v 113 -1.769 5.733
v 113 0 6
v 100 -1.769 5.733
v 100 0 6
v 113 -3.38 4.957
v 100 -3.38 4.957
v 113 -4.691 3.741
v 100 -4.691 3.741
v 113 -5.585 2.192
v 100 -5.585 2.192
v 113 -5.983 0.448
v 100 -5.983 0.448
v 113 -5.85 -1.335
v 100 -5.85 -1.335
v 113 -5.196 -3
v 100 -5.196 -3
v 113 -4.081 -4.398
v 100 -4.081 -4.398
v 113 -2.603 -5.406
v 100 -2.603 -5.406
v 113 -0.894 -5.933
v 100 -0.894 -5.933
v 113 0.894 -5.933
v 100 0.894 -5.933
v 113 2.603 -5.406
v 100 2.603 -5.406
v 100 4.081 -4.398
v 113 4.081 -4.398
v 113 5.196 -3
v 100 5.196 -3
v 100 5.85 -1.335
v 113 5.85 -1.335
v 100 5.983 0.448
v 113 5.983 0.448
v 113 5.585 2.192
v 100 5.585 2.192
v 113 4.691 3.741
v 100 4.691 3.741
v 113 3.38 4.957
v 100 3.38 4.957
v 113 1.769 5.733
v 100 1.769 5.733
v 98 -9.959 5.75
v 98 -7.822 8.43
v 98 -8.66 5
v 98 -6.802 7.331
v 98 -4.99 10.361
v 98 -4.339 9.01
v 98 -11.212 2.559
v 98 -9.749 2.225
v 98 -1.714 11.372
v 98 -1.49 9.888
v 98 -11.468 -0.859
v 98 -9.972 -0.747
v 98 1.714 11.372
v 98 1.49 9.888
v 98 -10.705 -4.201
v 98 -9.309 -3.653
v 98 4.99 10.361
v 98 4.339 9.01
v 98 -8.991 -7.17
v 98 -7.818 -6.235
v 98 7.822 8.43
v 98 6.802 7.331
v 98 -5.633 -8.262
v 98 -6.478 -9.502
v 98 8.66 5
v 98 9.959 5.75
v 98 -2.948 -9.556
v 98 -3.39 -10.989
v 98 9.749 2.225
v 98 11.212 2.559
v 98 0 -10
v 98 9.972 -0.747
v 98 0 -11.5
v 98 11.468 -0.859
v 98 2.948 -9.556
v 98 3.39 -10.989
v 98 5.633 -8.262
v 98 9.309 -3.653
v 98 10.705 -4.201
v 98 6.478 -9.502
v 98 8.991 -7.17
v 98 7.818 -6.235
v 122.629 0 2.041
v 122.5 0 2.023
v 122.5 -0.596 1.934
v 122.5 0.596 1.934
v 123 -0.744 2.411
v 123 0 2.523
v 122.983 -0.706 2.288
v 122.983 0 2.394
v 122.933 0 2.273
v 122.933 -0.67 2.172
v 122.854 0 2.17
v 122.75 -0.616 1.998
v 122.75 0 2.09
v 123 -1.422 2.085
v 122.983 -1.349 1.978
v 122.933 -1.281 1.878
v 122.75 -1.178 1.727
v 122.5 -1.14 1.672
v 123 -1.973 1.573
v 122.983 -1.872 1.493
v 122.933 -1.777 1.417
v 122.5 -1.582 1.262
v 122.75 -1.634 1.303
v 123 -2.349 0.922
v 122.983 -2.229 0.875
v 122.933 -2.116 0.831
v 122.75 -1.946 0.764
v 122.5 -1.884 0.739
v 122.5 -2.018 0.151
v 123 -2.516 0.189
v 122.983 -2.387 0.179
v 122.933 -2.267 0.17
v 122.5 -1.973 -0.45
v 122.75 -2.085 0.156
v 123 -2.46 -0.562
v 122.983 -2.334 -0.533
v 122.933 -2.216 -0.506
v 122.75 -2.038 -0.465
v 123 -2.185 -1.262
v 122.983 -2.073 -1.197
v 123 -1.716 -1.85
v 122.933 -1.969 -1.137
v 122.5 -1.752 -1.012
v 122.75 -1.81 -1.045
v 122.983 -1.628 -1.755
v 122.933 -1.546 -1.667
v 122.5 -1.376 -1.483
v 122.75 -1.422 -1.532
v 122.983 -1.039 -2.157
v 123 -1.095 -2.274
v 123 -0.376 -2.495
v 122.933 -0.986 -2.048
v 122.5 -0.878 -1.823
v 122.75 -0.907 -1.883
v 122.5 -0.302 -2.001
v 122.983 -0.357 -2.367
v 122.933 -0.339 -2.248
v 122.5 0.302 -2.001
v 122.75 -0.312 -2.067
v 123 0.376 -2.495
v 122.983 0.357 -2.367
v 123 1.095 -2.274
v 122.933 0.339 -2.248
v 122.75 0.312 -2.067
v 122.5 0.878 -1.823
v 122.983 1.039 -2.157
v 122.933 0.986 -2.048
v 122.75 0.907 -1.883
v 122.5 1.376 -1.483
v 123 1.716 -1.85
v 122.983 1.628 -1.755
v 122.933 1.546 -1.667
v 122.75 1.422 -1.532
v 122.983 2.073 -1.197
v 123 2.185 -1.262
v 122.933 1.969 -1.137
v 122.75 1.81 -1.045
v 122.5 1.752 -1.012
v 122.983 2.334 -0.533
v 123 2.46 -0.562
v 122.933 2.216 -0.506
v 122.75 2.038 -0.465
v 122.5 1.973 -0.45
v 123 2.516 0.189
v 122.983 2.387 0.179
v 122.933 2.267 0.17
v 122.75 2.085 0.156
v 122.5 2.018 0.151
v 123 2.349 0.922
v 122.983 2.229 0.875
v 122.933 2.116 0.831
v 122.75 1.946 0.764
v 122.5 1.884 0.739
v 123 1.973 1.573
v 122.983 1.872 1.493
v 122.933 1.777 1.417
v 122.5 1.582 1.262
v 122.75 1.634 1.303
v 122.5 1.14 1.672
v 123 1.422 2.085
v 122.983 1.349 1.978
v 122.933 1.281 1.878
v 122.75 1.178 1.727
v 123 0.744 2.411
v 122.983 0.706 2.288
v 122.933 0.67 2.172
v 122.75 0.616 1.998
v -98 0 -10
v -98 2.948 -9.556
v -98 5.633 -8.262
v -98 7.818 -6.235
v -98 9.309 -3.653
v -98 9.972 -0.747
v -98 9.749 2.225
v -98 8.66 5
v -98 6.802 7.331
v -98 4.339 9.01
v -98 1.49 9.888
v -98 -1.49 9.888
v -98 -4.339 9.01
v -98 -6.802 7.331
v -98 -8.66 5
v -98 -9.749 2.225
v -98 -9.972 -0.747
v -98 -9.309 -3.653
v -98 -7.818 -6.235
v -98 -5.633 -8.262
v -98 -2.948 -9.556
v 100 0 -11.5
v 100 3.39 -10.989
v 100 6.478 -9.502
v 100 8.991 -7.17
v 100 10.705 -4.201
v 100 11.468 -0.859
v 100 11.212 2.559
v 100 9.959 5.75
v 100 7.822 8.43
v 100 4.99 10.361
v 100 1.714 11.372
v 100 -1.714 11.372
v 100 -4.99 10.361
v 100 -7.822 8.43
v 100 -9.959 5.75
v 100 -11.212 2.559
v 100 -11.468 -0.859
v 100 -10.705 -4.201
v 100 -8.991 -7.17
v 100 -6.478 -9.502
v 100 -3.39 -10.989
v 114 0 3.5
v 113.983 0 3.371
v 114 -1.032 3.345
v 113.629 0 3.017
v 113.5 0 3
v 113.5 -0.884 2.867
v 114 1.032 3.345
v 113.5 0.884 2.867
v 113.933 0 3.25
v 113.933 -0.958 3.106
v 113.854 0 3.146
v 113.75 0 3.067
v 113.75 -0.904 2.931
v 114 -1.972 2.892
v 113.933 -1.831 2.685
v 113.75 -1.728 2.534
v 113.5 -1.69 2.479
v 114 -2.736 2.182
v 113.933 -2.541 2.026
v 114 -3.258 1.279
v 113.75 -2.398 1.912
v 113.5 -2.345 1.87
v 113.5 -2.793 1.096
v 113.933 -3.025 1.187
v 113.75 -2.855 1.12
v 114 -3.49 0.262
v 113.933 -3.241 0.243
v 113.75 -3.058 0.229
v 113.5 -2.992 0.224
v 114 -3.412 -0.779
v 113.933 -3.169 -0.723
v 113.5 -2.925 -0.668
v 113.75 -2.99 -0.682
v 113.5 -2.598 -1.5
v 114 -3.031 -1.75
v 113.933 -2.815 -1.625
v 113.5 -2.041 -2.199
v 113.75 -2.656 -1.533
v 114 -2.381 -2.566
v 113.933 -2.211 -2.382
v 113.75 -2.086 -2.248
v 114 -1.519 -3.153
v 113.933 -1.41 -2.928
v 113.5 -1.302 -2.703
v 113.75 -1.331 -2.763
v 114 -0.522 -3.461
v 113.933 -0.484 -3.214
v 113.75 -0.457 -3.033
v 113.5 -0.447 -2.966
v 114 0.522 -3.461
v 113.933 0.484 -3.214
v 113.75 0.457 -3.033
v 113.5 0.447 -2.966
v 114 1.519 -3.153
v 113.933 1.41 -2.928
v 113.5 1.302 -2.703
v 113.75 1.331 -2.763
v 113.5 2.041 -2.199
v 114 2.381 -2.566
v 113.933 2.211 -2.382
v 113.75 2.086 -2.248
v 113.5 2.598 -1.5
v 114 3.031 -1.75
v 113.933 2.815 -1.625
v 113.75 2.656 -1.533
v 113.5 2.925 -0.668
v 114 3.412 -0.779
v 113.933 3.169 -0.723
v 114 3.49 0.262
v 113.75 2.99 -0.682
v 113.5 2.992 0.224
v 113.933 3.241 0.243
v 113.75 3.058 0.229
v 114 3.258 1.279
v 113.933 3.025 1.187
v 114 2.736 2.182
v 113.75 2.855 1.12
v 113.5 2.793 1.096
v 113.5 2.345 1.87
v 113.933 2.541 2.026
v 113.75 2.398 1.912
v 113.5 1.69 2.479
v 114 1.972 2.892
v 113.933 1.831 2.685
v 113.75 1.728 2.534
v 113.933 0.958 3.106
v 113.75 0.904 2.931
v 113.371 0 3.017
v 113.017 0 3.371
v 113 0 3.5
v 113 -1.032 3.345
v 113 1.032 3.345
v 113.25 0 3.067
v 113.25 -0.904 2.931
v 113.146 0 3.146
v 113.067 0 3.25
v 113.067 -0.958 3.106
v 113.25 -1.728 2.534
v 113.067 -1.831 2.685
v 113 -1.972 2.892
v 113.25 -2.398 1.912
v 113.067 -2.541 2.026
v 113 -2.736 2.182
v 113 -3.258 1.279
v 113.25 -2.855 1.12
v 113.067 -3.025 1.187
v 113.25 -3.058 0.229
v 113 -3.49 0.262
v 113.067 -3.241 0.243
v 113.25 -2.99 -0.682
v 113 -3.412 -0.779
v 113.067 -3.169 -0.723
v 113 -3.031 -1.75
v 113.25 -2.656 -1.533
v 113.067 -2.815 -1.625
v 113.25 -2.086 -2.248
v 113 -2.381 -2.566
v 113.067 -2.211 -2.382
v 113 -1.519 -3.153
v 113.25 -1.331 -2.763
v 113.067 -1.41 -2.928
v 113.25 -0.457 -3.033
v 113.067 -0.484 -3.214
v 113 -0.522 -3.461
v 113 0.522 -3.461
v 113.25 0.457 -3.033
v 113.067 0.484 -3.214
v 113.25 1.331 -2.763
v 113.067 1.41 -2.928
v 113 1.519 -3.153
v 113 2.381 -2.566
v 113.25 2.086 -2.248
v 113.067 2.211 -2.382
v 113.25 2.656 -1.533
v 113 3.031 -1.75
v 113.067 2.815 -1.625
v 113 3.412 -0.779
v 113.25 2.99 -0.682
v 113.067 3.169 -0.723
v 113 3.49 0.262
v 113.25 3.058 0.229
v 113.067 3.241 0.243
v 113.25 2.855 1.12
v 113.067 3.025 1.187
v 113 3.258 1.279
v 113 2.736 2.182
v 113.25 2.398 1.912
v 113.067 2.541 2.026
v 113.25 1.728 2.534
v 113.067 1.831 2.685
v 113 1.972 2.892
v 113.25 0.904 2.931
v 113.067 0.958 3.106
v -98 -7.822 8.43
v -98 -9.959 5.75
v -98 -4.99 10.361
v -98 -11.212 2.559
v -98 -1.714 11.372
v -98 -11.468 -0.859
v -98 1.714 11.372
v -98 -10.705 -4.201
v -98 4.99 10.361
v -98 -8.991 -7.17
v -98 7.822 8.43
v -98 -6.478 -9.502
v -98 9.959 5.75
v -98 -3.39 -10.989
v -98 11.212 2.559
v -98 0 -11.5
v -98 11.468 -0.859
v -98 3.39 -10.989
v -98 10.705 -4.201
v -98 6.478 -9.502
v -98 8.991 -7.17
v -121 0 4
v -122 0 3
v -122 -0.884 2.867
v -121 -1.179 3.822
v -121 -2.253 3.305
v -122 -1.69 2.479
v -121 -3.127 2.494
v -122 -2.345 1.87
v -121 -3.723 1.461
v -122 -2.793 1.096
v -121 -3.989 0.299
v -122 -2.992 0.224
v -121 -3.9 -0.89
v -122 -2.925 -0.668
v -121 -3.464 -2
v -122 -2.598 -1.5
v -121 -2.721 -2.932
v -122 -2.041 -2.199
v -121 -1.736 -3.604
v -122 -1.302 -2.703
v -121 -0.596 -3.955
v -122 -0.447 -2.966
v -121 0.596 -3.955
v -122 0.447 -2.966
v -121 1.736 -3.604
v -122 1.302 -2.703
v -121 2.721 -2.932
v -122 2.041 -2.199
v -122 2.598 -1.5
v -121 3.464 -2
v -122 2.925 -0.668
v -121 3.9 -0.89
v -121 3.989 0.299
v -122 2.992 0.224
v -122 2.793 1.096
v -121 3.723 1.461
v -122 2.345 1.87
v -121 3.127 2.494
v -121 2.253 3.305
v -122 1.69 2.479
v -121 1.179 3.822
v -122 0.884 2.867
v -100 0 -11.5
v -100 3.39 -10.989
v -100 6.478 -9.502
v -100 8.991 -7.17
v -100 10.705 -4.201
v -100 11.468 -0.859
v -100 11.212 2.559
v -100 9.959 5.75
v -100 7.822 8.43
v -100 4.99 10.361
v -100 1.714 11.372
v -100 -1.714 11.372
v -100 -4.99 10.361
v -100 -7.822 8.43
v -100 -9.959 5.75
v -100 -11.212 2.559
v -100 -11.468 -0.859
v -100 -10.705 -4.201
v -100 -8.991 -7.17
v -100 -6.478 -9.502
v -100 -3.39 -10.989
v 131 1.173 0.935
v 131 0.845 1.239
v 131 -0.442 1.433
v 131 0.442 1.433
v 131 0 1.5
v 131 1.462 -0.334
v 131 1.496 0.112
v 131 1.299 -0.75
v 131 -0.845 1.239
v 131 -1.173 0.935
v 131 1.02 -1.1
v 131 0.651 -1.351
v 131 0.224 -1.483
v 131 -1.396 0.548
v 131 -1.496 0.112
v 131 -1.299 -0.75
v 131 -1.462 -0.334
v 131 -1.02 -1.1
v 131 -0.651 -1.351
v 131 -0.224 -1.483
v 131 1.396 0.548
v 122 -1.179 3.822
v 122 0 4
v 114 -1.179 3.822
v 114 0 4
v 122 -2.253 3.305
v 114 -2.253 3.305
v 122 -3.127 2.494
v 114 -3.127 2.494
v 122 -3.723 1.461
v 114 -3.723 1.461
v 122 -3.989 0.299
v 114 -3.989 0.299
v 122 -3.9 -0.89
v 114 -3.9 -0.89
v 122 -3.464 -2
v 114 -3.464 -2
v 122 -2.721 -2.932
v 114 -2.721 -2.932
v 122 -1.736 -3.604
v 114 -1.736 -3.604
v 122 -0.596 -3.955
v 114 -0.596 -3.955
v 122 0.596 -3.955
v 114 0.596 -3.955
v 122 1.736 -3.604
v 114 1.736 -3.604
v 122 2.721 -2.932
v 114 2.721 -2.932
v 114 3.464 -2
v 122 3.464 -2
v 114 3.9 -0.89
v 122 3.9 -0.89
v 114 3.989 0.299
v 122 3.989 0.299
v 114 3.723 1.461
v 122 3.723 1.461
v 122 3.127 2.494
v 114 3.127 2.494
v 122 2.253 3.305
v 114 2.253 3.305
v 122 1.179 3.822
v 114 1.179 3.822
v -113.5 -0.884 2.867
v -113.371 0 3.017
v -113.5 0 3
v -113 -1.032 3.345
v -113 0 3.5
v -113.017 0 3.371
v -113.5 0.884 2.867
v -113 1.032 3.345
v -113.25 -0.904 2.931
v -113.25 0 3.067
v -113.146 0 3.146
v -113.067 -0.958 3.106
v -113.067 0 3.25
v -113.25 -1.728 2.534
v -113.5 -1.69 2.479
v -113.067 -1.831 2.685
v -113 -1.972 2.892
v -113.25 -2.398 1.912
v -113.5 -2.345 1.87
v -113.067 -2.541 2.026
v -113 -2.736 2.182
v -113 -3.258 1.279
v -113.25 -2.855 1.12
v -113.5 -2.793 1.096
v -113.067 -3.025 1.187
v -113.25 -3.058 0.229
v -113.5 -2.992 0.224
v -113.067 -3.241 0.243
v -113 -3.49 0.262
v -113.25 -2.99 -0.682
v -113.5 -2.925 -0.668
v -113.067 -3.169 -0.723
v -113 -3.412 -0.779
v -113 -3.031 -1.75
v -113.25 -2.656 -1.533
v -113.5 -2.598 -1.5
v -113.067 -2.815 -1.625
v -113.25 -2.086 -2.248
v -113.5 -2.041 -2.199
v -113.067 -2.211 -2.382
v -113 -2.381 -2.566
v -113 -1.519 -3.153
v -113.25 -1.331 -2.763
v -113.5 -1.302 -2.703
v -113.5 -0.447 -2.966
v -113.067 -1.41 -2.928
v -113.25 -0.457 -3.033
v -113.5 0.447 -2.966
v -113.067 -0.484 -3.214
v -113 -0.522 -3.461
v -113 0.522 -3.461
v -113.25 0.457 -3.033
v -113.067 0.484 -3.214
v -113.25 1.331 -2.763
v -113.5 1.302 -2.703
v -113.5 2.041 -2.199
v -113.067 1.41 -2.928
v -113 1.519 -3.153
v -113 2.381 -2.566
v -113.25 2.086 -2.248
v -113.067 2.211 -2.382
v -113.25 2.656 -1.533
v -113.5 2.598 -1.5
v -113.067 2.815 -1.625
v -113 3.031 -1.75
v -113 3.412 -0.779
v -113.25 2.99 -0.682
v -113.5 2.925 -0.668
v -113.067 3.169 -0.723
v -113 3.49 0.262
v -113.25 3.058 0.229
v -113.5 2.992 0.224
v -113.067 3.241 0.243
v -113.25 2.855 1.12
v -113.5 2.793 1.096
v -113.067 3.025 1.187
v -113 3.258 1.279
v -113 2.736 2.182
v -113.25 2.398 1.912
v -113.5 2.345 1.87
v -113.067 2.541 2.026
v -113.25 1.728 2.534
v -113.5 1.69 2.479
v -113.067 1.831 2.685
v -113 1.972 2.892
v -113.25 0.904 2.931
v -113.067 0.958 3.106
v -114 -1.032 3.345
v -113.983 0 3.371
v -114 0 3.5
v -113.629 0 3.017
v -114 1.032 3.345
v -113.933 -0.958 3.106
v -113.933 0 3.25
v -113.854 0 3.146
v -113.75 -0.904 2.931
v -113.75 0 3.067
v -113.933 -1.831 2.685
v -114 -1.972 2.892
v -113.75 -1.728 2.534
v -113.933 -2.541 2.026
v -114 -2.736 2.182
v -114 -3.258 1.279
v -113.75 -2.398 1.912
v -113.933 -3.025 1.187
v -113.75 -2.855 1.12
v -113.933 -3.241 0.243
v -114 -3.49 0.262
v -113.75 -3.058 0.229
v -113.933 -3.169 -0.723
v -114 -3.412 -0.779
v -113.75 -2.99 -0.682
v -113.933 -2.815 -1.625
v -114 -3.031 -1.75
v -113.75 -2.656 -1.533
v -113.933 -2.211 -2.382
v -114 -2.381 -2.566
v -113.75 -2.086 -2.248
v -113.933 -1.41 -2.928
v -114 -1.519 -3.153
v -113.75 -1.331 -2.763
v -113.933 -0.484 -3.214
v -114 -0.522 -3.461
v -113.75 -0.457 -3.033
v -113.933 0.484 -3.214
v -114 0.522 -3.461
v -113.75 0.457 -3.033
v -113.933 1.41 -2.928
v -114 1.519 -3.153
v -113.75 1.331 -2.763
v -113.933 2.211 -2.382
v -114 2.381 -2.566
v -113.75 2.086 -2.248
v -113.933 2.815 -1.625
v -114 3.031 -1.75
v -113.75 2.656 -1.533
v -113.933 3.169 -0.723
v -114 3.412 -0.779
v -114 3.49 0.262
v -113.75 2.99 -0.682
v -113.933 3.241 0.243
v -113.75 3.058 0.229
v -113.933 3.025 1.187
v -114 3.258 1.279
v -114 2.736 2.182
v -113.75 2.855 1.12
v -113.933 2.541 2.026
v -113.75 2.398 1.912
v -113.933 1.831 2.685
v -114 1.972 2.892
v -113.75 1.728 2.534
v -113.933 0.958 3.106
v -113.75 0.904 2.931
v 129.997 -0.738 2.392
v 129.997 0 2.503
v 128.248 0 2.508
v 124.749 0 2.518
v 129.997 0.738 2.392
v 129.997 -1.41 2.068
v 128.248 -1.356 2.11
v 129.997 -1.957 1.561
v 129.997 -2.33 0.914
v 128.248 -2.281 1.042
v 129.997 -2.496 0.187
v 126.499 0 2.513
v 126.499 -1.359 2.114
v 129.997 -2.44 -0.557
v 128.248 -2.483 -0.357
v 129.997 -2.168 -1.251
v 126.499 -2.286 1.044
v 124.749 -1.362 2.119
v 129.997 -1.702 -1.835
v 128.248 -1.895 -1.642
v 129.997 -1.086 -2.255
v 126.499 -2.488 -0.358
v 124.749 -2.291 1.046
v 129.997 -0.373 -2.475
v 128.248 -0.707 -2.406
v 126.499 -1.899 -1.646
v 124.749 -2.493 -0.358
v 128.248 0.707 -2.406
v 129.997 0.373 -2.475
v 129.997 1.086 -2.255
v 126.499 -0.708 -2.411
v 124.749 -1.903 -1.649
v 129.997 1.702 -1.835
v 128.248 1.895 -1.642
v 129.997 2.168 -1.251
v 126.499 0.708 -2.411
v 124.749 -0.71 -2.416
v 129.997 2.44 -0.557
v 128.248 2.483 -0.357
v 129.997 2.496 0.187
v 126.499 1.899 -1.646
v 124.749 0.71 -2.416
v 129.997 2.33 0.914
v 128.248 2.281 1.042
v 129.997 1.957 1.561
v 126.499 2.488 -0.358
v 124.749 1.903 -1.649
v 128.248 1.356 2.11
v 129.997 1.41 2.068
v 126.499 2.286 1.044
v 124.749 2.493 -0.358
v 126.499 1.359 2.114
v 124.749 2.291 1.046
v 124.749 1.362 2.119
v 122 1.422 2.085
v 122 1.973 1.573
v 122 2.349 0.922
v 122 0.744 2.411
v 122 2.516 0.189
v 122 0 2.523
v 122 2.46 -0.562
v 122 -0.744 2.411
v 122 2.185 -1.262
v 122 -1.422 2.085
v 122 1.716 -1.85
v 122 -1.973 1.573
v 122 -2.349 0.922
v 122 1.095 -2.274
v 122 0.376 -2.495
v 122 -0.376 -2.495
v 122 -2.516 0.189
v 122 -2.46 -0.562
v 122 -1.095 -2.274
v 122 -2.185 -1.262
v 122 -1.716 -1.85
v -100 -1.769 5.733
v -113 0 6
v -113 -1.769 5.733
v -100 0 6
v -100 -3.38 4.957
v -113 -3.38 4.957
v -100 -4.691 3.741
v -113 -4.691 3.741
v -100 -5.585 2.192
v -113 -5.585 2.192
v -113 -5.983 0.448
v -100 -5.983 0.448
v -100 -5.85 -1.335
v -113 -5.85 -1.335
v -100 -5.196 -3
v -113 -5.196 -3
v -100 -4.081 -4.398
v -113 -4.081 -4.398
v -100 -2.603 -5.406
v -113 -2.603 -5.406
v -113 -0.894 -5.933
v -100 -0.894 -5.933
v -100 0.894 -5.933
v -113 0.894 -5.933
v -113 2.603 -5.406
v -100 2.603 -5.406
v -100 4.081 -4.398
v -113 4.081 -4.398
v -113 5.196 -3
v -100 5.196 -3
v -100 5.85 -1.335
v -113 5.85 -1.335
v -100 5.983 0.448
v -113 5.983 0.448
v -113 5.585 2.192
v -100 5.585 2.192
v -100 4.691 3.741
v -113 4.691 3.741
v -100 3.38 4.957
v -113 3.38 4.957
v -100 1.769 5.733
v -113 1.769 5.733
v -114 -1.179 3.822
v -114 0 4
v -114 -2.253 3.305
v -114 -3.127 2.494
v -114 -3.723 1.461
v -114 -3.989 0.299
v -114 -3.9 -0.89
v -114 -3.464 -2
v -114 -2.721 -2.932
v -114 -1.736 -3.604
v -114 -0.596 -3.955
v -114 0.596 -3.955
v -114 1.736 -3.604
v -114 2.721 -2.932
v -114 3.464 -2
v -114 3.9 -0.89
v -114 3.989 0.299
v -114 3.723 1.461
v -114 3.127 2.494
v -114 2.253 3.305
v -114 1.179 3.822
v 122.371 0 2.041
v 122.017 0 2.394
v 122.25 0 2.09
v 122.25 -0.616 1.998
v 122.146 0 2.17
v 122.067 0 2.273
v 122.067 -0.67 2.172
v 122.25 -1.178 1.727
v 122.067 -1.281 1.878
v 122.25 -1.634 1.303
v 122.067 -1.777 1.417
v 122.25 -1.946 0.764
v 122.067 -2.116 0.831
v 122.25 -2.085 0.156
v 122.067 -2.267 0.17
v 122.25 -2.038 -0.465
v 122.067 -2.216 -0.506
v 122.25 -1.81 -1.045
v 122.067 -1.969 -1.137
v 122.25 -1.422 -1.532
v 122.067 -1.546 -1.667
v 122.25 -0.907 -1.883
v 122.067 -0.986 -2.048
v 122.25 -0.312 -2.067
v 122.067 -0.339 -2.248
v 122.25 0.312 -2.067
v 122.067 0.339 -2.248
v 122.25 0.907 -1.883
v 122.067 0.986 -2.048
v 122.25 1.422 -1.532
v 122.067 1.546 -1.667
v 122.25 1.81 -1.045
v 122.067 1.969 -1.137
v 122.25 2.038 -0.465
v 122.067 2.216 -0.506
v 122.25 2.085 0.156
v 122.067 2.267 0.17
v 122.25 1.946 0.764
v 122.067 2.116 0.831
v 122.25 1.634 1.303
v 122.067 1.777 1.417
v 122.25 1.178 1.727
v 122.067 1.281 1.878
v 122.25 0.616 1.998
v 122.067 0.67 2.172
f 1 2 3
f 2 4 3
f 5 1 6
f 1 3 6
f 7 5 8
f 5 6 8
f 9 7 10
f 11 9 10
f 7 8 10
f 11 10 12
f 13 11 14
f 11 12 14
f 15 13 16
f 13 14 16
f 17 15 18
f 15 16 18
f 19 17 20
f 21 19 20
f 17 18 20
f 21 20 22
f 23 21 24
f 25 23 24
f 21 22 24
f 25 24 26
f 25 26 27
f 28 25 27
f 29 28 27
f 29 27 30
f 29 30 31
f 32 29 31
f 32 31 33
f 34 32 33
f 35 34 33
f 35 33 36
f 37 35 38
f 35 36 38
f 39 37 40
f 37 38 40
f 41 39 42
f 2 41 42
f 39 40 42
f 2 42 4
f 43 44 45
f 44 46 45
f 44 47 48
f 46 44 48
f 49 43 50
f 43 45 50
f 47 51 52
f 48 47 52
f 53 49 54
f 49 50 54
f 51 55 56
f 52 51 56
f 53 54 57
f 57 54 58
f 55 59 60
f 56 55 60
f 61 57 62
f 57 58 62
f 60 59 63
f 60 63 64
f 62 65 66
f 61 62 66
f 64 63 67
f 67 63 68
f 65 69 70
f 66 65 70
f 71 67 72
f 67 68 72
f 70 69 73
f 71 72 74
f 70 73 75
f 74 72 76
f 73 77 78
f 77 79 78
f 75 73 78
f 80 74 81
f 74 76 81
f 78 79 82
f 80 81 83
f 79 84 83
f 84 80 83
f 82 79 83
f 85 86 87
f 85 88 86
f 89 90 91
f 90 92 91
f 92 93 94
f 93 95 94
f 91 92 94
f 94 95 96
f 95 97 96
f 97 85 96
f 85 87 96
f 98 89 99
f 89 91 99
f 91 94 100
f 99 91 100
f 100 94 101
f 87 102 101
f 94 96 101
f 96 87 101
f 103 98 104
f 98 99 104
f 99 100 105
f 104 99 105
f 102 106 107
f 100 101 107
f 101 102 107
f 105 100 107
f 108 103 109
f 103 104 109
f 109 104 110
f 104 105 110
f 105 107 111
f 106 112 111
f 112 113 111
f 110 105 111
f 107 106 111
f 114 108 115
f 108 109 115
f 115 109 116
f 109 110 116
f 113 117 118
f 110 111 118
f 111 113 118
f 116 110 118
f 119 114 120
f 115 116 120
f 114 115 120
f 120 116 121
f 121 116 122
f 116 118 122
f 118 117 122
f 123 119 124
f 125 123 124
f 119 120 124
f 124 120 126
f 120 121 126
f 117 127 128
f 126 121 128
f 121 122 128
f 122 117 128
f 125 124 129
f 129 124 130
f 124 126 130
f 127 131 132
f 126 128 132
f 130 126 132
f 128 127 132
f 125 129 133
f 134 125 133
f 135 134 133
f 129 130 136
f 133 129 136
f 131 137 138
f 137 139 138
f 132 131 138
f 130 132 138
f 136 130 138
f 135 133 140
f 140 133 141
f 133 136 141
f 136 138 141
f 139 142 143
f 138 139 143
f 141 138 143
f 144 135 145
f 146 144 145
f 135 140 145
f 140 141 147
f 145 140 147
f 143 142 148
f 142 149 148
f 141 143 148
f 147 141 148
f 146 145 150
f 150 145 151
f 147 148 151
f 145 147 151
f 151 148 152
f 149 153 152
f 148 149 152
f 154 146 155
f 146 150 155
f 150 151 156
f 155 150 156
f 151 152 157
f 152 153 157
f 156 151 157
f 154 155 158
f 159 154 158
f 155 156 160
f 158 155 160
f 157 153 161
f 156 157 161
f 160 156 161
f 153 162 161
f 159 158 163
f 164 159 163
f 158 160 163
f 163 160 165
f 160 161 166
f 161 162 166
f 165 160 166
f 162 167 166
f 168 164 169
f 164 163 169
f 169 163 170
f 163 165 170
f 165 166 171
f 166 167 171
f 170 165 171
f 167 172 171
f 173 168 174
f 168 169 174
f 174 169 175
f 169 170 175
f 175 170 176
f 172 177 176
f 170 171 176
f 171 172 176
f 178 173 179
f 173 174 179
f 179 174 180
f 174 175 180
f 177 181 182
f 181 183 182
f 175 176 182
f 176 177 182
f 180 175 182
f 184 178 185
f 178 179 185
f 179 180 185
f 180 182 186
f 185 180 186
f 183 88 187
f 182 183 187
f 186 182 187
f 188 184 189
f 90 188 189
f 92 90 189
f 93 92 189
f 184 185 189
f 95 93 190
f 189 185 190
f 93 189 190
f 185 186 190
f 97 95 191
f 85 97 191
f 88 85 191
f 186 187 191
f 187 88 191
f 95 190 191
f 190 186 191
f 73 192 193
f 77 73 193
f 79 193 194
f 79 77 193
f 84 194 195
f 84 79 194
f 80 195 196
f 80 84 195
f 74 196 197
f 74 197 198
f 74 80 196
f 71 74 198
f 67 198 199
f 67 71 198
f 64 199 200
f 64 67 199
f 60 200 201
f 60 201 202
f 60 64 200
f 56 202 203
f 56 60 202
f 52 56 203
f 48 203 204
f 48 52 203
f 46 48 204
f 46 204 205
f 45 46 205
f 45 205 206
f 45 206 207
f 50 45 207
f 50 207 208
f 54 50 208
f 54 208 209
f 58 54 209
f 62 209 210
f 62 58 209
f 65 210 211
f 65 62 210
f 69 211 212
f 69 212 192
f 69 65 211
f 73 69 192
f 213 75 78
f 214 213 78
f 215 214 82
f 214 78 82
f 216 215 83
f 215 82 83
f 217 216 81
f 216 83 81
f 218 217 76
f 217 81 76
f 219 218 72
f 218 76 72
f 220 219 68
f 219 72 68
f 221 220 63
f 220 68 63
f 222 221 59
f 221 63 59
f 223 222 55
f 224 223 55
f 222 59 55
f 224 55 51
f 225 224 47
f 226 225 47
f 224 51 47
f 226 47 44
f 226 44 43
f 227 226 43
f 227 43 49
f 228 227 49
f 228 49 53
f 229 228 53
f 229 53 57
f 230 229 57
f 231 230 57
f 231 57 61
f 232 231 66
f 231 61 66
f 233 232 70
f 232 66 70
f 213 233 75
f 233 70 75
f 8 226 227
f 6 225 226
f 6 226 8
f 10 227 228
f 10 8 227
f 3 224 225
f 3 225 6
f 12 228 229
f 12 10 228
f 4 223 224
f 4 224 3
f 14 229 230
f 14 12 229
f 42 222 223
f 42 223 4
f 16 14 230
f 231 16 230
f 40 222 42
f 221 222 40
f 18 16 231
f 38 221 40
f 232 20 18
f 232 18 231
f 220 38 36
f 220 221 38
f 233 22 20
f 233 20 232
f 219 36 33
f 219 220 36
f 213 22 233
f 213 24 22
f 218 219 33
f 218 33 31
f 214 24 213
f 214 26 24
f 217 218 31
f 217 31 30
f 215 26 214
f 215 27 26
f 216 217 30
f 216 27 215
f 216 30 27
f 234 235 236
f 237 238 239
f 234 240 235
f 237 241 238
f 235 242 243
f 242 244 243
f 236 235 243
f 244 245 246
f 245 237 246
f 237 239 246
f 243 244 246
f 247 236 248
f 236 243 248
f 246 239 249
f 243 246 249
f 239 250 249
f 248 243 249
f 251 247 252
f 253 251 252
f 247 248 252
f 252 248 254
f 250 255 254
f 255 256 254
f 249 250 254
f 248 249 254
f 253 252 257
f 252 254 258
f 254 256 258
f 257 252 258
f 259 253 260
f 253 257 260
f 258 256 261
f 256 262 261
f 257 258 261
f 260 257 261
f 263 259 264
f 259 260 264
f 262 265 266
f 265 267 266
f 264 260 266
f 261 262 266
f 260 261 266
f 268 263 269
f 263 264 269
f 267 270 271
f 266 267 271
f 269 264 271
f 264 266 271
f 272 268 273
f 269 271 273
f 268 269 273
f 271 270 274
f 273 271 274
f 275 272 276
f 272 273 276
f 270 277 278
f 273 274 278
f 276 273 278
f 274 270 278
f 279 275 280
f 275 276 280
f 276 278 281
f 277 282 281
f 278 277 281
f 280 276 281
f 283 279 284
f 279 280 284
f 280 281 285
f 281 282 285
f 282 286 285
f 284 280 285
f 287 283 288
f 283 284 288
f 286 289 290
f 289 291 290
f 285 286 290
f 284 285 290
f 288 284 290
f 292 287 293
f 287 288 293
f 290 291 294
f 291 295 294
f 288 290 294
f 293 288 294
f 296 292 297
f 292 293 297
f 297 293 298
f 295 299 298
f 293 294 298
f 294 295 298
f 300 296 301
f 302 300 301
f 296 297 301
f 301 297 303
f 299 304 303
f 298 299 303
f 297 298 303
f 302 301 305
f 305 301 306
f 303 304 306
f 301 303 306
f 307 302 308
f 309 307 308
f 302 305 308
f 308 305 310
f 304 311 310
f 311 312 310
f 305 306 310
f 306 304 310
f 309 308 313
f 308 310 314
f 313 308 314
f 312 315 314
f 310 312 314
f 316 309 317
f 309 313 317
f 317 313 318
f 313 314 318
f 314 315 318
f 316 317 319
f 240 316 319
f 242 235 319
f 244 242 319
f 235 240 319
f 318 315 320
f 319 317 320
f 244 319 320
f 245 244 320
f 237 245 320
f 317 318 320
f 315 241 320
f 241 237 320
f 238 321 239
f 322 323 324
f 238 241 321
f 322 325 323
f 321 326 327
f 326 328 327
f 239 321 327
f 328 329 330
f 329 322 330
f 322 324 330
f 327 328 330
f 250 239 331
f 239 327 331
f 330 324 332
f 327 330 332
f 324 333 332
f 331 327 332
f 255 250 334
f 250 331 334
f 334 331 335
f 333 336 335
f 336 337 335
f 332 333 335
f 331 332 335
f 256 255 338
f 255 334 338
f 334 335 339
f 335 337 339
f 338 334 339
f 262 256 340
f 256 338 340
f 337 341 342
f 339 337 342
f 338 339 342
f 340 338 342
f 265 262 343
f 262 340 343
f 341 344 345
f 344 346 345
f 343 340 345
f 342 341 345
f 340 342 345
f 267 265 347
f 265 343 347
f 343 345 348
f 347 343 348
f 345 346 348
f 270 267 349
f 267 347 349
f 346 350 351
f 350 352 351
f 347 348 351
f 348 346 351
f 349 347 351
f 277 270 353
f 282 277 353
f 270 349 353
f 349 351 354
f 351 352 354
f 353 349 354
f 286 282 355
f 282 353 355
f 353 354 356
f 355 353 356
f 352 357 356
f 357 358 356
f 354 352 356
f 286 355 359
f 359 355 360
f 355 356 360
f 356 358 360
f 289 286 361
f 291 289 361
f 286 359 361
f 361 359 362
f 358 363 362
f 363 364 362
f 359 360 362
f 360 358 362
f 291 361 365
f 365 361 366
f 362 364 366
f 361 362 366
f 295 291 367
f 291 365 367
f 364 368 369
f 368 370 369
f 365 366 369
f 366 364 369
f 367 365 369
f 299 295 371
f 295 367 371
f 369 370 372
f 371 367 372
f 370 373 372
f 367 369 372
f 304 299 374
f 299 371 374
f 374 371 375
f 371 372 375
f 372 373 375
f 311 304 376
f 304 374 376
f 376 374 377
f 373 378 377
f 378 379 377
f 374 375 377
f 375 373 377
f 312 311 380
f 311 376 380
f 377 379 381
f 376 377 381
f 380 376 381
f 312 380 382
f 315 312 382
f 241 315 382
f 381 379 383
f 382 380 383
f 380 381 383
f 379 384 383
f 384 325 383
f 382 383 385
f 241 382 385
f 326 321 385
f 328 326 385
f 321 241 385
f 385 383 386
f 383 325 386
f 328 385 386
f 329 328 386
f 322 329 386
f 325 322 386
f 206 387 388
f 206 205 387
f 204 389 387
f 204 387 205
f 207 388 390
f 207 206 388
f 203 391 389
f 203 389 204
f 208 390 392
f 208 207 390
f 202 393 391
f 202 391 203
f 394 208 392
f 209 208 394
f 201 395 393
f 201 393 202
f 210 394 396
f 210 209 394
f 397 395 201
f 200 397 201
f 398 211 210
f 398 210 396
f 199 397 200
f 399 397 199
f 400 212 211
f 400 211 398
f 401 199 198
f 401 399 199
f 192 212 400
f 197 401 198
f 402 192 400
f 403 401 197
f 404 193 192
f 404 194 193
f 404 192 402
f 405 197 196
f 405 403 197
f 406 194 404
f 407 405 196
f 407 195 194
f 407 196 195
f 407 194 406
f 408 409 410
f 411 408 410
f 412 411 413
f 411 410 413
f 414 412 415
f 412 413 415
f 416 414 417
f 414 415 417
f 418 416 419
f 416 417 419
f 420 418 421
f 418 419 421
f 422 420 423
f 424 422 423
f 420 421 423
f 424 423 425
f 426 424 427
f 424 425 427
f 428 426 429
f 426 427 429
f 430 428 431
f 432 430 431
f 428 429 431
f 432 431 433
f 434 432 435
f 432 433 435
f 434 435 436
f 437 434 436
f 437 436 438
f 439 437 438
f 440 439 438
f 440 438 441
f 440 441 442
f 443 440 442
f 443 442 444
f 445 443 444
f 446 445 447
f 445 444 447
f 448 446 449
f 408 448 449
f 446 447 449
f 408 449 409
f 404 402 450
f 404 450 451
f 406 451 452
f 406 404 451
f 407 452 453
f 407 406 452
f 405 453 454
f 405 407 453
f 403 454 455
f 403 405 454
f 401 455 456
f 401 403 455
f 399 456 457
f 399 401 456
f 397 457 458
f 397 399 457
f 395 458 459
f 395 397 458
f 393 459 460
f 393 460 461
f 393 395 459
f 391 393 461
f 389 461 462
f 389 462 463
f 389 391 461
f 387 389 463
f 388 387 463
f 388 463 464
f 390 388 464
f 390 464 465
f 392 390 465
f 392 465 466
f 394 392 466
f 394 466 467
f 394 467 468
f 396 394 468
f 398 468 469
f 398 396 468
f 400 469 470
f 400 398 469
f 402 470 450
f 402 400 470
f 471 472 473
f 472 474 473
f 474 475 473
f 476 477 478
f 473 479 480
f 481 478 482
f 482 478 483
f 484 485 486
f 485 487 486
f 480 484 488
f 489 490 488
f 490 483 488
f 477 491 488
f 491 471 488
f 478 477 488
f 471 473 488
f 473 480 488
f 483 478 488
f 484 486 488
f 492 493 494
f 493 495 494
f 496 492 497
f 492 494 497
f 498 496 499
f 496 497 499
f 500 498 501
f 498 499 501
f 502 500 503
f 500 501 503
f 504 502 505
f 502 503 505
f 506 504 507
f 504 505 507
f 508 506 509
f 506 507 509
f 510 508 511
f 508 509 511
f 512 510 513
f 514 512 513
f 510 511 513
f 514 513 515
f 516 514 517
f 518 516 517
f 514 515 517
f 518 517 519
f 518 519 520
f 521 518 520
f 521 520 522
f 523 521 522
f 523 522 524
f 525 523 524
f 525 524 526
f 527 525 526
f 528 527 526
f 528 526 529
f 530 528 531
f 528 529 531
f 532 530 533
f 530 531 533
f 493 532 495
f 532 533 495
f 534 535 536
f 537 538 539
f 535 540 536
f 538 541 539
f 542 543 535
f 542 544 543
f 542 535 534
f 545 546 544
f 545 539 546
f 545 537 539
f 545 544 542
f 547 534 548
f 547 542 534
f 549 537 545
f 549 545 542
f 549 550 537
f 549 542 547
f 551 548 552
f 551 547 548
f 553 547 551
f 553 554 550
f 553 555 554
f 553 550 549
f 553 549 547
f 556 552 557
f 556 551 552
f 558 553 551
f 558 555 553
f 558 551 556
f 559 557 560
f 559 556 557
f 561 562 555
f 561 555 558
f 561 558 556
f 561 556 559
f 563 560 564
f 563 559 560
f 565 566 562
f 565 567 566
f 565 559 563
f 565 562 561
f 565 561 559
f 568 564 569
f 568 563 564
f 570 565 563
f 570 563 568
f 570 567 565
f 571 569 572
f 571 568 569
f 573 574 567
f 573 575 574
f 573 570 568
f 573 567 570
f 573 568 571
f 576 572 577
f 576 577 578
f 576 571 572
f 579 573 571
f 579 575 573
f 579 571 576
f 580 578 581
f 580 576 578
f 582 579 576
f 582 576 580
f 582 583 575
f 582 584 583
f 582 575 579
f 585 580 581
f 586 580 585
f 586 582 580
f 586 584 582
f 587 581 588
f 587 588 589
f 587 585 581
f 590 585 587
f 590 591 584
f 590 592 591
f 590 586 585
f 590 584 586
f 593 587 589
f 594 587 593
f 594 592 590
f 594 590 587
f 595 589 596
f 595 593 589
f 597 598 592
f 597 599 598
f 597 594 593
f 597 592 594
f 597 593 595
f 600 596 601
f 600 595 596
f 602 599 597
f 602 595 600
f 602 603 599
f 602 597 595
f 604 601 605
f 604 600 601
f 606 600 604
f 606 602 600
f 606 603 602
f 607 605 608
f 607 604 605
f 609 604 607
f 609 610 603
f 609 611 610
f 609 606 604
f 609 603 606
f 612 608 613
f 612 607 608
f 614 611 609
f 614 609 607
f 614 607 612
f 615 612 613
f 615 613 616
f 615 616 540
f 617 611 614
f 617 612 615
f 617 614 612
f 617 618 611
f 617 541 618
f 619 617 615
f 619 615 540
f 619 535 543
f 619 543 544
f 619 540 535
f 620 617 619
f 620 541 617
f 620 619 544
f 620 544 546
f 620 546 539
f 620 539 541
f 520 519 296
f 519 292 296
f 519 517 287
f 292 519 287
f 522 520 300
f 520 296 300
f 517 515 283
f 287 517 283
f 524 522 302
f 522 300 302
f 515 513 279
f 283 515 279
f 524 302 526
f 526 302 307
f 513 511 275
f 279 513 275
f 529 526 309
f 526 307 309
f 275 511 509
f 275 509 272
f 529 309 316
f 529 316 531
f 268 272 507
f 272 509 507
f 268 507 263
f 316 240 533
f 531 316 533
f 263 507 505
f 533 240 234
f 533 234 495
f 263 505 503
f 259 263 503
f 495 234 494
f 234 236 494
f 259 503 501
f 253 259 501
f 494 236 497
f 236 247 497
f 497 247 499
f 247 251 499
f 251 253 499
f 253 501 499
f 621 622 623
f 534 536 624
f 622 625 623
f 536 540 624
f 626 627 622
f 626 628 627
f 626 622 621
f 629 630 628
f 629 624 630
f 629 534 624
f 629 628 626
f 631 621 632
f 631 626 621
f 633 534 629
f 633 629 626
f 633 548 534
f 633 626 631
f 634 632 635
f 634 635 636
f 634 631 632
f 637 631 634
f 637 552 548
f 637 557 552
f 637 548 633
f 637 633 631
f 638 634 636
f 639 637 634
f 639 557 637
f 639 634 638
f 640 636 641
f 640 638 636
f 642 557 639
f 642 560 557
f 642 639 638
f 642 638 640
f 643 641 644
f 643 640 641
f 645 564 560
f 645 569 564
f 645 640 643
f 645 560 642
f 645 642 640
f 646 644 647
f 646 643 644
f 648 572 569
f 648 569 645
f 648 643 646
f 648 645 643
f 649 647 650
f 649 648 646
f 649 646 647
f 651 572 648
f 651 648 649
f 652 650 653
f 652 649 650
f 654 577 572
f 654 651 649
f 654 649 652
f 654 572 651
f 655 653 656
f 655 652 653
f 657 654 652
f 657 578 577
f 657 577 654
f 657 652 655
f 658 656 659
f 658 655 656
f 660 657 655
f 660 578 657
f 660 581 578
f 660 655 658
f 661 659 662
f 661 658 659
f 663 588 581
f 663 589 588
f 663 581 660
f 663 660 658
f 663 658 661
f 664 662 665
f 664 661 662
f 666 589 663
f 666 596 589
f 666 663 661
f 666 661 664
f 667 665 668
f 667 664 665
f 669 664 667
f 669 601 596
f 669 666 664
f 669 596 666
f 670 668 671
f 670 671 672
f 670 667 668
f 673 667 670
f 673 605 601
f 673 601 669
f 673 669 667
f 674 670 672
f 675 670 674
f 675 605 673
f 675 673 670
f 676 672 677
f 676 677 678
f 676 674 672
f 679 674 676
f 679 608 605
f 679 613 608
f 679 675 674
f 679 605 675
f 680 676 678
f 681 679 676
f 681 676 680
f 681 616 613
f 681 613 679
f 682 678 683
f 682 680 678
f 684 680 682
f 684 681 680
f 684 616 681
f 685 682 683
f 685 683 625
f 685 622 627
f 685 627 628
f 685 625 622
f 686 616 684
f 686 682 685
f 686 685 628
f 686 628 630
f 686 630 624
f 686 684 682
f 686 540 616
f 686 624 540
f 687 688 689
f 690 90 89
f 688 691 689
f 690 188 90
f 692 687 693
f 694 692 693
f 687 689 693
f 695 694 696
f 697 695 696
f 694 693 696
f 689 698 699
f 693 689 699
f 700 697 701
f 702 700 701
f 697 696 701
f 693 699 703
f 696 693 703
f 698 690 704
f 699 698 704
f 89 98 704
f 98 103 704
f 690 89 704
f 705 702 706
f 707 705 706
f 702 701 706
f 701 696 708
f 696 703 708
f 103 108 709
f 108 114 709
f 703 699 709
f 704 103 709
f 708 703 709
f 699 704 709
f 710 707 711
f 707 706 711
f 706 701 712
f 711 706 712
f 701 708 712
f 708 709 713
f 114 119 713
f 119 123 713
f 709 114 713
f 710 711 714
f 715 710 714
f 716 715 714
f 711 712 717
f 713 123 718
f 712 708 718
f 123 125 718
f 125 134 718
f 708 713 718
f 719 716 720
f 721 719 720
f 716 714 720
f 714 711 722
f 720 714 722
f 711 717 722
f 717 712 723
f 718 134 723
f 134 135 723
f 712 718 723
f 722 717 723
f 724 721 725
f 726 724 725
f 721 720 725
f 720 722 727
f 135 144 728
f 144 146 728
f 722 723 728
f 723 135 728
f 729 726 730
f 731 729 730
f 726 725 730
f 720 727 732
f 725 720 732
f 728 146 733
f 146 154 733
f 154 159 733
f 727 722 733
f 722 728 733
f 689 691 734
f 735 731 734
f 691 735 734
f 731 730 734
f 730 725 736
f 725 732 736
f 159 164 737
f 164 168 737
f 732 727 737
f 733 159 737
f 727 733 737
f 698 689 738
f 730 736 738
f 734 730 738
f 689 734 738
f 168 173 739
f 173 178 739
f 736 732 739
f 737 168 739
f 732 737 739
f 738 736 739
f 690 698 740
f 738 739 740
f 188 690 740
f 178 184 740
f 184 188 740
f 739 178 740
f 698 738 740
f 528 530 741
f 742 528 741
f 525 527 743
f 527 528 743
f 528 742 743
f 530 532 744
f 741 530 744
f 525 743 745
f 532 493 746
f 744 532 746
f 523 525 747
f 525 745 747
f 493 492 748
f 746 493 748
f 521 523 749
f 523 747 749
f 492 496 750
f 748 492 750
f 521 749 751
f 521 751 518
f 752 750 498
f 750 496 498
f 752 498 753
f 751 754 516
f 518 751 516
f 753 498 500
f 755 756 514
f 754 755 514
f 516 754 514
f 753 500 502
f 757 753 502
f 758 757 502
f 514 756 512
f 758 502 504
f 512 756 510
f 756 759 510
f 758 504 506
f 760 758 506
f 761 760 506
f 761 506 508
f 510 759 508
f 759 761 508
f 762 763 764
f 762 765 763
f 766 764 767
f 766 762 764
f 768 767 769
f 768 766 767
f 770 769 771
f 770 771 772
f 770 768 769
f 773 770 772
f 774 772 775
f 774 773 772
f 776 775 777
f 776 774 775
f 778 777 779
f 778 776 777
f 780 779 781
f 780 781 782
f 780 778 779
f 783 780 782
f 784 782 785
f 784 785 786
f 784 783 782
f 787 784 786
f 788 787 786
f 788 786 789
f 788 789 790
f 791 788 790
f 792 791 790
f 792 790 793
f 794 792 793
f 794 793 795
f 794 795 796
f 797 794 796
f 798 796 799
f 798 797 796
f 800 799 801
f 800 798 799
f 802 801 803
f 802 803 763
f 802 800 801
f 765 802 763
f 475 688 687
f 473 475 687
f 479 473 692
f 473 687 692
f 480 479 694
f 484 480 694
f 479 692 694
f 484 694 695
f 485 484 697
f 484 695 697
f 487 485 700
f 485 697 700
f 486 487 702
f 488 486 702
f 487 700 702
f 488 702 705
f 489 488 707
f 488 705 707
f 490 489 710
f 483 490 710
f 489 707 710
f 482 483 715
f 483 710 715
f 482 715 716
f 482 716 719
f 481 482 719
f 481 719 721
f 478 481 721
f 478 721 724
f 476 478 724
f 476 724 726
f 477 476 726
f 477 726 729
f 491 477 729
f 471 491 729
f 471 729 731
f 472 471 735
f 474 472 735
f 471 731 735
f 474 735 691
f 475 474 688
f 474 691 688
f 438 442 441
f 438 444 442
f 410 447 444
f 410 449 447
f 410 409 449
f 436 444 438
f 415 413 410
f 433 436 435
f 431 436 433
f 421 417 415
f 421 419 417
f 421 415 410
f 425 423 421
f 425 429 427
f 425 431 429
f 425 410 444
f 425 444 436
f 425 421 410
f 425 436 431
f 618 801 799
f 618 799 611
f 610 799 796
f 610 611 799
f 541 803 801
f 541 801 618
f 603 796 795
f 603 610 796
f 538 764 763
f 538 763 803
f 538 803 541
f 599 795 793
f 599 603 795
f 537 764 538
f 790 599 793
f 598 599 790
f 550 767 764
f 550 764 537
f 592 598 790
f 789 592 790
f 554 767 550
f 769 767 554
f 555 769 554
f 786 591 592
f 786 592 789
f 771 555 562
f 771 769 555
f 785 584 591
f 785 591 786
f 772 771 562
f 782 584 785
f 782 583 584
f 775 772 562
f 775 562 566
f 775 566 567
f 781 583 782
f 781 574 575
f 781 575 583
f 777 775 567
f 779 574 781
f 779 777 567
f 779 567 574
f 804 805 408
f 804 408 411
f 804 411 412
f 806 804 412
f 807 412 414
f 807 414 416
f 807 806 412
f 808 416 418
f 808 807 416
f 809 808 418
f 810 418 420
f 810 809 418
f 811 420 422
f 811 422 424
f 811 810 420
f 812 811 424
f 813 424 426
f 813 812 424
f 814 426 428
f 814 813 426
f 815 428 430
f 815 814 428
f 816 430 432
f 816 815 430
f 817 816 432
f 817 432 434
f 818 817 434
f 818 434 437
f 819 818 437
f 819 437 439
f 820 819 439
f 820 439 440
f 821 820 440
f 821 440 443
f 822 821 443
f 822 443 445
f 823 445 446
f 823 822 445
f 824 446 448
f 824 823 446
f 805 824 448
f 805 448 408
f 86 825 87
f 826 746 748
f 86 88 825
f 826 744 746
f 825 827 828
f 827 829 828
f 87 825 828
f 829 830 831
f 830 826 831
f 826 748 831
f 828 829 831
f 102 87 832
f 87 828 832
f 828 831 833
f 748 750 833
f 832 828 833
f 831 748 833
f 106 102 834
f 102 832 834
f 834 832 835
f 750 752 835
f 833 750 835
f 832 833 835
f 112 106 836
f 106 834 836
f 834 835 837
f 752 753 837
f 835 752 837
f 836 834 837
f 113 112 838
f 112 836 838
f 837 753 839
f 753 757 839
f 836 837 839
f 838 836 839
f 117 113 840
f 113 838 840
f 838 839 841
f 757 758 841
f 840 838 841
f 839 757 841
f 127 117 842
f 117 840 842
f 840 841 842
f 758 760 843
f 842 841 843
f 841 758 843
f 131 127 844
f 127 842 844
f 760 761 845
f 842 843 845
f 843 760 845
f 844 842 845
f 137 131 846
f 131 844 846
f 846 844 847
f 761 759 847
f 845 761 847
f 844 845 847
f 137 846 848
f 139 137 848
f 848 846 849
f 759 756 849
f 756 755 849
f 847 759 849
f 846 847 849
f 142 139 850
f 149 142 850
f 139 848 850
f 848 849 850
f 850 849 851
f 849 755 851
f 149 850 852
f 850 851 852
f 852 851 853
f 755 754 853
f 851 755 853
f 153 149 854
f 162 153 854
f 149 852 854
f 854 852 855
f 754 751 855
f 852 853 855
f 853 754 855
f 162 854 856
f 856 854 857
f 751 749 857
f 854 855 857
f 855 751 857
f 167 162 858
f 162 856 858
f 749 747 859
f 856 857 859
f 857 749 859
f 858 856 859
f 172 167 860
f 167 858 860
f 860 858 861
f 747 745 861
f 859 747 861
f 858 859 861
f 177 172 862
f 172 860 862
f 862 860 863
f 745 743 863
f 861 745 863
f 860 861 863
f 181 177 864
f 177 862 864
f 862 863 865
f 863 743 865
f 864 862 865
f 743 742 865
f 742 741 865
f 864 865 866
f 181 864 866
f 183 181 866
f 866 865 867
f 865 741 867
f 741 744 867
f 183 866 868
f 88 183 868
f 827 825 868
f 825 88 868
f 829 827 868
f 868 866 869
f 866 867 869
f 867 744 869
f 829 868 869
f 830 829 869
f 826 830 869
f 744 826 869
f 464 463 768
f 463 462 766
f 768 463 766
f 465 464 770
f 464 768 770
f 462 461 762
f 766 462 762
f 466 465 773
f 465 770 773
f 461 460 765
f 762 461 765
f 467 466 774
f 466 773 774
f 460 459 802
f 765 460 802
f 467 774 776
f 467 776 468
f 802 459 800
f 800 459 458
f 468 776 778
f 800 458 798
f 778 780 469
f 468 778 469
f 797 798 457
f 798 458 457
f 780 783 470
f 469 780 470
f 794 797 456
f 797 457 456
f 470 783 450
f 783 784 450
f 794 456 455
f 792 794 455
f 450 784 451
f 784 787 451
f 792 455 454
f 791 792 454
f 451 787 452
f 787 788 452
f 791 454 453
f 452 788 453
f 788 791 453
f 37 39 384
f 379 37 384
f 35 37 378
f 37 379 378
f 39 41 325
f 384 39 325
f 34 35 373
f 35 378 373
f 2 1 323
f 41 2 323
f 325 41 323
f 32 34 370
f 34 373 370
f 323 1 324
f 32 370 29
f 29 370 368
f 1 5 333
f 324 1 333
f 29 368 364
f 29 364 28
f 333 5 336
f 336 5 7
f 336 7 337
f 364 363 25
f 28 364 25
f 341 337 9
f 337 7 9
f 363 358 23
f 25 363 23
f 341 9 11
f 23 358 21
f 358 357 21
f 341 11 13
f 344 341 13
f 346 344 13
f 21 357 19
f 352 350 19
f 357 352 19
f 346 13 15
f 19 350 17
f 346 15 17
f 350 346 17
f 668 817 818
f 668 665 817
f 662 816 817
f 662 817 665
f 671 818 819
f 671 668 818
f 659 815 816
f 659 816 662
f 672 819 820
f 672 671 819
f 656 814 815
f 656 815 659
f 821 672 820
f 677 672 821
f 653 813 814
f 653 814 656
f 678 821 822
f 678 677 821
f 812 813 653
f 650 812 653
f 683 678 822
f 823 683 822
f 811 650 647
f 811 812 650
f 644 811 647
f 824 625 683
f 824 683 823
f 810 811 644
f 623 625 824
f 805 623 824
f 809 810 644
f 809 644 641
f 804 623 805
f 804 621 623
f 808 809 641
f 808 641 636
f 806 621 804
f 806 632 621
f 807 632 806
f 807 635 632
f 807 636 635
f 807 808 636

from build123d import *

# Parameters (mm, degrees)
SKETCH2_R           = 10
BOSS_EXTRUDE1_DEPTH = 98
SKETCH11_R          = 11.5
BOSS_EXTRUDE3_DEPTH = 2
CHAMFER2_SIZE       = 1
CHAMFER2_SIZE2      = 1.002948478
SKETCH15_R          = 2.523484115
CUT_EXTRUDE2_DEPTH  = 9
CHAMFER4_SIZE       = 1


with BuildPart() as part:
    # Sketch2 → Boss-Extrude1 (new body)
    with BuildSketch(Plane(origin=(0, 0, 0), x_dir=(0, 0, -1), z_dir=(1, 0, 0))):
        Circle(SKETCH2_R)
    extrude(amount=BOSS_EXTRUDE1_DEPTH)

    # Sketch11 → Boss-Extrude3 (add)
    with BuildSketch(Plane(origin=(98, 0, 0), x_dir=(0, 0, -1), z_dir=(1, 0, 0))):
        Circle(SKETCH11_R)
    extrude(amount=BOSS_EXTRUDE3_DEPTH)

    # Mirror3: part across plane


with BuildPart() as part_1:
    add(part.part)
    add(part.part.mirror(Plane(origin=(0, 0, 0), x_dir=(0, 0, 1), z_dir=(1, 0, 0))))

    # Sketch14 → Revolve1 (revolve)
    with BuildSketch(Plane.XY, mode=Mode.PRIVATE) as revolve1_sk:
        with BuildLine():
            Line((100, 6), (100, 0))
            Line((100, 0), (131, 0))
            Line((131, 0), (131, 2.5))
            Line((131, 2.5), (123, 2.523484115))
            ThreePointArc((123, 2.523484115), (122.853553391, 2.169930724), (122.5, 2.023484115))
            ThreePointArc((122.5, 2.023484115), (122.146446609, 2.169930724), (122, 2.523484115))
            Line((122, 2.523484115), (122, 3))
            Line((122, 3), (122, 4))
            Line((122, 4), (114.5, 4))
            Line((114.5, 4), (114, 4))
            Line((114, 4), (114, 3.5))
            ThreePointArc((114, 3.5), (113.853553391, 3.146446609), (113.5, 3))
            ThreePointArc((113.5, 3), (113.146446609, 3.146446609), (113, 3.5))
            Line((113, 3.5), (113, 6))
            Line((113, 6), (100, 6))
        make_face()
    revolve1 = revolve(revolve1_sk.sketch.rotate(Axis((0, 0, 0), (1, 0, 0)), 90), axis=Axis((0, 0, 0), (1, 0, 0)))

    # Chamfer2
    chamfer2_edges = [part_1.edges().sort_by_distance(p)[0] for p in [
        (131, 0, -2.5),
    ]]
    chamfer2_side = [part_1.faces().sort_by_distance(p)[0] for p in [
        (131, 0, 0),
    ]]
    chamfer(chamfer2_edges, length=CHAMFER2_SIZE, length2=CHAMFER2_SIZE2, reference=chamfer2_side[0])

    # Mirror6: Revolve1 across plane
    add(revolve1.mirror(Plane(origin=(0, 0, 0), x_dir=(0, 0, 1), z_dir=(1, 0, 0))))

    # Sketch15 → Cut-Extrude2 (cut)
    with BuildSketch(Plane.ZY.offset(131)):
        Circle(SKETCH15_R)
    extrude(amount=-CUT_EXTRUDE2_DEPTH, mode=Mode.SUBTRACT)

    # Chamfer4
    chamfer4_edges = [part_1.edges().sort_by_distance(p)[0] for p in [
        (-122, 0, -4),
    ]]
    chamfer(chamfer4_edges, length=CHAMFER4_SIZE)


solid = part_1.part
